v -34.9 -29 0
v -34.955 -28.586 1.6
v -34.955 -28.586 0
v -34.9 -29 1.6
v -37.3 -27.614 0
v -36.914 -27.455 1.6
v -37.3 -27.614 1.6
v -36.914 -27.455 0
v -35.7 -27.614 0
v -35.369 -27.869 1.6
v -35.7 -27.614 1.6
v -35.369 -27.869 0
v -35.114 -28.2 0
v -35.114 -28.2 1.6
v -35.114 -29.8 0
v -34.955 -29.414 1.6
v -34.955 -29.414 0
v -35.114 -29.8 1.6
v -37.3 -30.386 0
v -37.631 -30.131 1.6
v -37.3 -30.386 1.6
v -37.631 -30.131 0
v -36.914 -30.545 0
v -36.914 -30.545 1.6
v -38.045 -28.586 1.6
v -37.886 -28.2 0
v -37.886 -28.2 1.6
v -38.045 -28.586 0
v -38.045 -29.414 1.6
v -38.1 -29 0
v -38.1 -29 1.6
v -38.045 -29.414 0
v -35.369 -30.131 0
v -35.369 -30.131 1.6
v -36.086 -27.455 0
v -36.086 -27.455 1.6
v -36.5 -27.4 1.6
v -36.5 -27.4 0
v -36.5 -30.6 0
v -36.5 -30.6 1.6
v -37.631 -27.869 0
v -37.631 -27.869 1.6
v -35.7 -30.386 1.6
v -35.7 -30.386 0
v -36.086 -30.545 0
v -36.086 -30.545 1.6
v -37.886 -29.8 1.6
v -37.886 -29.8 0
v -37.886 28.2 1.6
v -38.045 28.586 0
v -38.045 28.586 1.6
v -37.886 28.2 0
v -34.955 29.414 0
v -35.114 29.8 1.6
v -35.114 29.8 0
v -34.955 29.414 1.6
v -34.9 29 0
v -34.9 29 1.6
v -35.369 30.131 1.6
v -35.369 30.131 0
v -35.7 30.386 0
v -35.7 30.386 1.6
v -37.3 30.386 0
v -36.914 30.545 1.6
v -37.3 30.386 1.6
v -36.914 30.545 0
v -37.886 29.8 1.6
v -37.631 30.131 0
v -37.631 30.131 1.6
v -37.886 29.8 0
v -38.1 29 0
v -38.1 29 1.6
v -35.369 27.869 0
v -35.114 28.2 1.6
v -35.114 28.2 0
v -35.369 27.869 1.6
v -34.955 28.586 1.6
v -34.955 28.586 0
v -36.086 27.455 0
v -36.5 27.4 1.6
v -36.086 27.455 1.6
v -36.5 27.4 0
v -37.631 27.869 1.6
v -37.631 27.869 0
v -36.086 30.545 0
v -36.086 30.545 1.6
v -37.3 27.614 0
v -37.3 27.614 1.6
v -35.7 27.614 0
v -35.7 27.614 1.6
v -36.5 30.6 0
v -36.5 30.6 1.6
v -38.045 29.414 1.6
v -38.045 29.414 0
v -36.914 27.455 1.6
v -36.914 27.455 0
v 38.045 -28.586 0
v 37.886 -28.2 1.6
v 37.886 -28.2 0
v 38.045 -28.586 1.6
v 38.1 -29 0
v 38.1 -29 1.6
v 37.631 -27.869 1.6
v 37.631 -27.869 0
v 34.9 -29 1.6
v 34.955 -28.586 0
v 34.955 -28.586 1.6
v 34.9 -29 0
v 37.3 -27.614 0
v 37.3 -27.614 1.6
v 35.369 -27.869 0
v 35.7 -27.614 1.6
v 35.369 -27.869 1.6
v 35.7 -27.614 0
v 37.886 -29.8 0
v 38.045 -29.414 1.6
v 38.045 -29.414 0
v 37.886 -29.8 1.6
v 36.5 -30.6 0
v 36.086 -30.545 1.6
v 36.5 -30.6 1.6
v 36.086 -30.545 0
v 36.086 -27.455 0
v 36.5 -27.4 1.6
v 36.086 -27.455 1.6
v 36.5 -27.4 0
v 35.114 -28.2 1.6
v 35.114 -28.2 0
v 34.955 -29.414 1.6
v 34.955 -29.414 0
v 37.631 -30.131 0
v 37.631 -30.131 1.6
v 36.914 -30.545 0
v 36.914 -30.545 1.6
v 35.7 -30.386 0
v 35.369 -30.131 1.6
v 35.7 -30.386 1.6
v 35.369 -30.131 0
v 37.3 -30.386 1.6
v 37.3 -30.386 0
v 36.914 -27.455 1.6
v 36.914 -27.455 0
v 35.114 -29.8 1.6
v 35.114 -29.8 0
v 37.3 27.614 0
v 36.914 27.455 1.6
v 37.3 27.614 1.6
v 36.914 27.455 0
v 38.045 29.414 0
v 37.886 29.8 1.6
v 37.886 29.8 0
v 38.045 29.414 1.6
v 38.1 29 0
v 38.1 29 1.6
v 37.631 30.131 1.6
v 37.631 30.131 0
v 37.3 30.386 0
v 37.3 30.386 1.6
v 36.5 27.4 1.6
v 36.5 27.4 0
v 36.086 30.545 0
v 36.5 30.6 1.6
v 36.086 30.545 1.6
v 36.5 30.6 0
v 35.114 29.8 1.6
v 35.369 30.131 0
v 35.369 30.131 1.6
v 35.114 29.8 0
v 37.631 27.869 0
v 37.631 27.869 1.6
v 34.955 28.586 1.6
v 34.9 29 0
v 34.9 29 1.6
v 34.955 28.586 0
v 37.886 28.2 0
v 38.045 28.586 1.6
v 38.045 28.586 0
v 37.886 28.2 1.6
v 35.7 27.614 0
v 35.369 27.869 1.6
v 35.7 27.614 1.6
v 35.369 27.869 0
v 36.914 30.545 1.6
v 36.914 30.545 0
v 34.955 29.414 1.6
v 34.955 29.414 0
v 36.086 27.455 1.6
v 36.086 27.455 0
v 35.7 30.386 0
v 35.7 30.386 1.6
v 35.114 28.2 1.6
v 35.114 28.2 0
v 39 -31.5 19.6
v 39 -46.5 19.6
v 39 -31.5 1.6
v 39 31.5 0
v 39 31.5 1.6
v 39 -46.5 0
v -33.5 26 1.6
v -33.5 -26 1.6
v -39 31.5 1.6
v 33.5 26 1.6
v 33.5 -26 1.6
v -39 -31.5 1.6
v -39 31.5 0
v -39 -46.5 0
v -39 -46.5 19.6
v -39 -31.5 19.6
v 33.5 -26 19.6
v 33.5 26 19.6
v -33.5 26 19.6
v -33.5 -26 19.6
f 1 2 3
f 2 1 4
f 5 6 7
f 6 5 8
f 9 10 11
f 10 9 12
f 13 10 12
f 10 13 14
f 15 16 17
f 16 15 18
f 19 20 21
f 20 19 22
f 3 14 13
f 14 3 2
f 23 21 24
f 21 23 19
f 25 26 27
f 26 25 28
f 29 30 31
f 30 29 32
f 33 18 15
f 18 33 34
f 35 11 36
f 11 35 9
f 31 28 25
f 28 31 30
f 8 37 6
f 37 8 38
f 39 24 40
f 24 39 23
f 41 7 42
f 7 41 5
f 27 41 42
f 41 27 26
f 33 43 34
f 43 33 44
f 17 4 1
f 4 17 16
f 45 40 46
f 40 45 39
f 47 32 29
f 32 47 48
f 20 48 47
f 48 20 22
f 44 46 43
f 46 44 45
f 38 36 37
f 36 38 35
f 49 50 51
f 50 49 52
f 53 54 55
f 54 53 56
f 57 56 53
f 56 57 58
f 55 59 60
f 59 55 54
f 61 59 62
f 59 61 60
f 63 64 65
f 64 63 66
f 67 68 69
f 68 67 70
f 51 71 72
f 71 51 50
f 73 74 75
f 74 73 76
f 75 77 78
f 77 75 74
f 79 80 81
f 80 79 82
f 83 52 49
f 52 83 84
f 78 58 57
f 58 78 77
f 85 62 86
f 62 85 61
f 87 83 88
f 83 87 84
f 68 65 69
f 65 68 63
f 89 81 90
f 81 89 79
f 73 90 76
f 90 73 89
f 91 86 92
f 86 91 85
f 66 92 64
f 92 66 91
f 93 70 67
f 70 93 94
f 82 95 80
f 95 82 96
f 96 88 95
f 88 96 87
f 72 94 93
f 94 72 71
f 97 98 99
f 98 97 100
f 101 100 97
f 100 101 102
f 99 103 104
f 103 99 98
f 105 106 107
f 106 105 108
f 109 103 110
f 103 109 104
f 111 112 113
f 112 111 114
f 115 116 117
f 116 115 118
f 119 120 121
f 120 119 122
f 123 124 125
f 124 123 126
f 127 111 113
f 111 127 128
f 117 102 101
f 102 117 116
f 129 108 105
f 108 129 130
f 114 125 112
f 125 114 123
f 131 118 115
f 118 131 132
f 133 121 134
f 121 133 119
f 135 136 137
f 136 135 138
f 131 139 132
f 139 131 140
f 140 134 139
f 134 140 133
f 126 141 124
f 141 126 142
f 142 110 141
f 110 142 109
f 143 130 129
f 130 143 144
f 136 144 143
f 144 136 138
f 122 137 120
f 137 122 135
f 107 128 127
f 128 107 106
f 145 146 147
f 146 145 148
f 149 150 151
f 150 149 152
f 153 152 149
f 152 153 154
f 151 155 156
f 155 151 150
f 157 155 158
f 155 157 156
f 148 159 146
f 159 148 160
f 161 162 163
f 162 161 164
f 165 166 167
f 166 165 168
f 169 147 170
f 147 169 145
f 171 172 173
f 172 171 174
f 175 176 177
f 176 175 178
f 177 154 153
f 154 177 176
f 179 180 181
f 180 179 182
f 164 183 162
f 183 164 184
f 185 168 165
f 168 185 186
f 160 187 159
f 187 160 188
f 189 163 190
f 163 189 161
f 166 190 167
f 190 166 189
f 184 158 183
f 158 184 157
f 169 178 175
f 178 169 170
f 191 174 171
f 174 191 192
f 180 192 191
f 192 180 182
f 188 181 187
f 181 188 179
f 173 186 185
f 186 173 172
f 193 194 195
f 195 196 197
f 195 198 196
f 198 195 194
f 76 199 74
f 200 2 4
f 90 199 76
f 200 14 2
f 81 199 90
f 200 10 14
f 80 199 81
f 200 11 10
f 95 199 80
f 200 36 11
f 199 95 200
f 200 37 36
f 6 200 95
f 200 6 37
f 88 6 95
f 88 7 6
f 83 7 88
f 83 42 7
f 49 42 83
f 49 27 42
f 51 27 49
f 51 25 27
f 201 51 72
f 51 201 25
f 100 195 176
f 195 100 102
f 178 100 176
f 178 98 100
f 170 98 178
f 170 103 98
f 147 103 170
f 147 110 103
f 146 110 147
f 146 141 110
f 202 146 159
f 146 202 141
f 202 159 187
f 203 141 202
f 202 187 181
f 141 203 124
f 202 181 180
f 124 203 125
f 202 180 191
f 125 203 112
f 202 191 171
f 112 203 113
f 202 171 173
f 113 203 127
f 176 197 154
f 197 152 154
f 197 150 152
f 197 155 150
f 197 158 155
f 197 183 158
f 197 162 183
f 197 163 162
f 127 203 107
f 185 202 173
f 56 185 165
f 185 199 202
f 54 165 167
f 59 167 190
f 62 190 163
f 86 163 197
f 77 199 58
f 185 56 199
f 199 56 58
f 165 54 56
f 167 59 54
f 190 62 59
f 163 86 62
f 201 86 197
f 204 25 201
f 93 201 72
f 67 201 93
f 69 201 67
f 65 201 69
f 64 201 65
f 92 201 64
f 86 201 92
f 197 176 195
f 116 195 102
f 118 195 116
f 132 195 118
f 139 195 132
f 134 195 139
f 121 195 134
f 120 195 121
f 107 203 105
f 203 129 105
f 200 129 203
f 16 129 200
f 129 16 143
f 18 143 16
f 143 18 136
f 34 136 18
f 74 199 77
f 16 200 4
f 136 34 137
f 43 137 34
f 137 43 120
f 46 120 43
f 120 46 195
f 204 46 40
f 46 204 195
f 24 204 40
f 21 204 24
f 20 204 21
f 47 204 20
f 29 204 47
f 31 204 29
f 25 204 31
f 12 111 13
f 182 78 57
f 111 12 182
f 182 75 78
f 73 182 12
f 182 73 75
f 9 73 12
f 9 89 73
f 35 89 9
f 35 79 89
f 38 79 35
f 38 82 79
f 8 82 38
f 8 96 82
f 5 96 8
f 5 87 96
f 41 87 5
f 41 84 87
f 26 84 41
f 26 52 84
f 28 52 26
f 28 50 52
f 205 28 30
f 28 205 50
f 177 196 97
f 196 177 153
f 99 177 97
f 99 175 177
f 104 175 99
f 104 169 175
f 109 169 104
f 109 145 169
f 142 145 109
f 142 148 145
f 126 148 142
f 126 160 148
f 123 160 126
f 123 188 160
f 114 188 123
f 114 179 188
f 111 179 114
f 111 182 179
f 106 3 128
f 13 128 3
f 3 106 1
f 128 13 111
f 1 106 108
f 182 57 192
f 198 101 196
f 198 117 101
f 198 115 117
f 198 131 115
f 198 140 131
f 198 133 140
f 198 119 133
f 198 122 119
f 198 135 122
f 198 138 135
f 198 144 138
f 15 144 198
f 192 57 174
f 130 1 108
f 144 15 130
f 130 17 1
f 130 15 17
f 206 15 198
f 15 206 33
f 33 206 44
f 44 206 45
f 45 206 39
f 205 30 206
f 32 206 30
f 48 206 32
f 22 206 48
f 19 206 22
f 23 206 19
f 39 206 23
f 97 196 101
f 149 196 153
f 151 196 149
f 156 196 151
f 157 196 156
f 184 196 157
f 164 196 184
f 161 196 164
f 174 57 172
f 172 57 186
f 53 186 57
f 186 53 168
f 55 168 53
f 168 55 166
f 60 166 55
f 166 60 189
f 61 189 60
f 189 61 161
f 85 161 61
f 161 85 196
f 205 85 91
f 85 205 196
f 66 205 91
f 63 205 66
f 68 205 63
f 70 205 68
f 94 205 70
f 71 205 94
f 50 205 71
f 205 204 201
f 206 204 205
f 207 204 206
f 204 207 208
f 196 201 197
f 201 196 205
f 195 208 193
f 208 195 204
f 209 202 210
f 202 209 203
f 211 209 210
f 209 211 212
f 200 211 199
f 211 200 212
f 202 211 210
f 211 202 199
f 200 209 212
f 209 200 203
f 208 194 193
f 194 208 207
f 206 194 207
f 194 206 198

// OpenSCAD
//
// ============================================================================
// SteamMachine UM790
// Project Phoenix
//
// Archivo  : esp32.scad
// Versión  : 1.0
// Fecha    : 2026-08-03
//
// Volumen mecánico de referencia de la placa "ESP32 Terminal Adapter"
// (78 x 63 mm, taladros M3 con separación 73 x 58 mm) para el
// ensamblaje virtual v1.
//
// NO ES UNA PIEZA IMPRIMIBLE.
//
// Sistema de coordenadas LOCAL de este módulo:
//   Origen (0,0,0) = centro de la placa en X/Y, cara inferior
//                     (plano de apoyo sobre la repisa de montaje).
//   +Z = hacia arriba (hacia el módulo ESP32 y las regletas).
//
// ============================================================================

include <../../../00_parametros.scad>;

$fn = 24;

part_version = "1.0";


//=============================================================================
// COLORES
//=============================================================================

esp32BoardColor     = [0.65,0.10,0.10,1.0];
esp32ModuleColor    = [0.15,0.15,0.55,1.0];
esp32HoleColor      = [1.00,0.00,0.00,1.0];
esp32CableColor     = [1.00,0.65,0.00,0.15];


//=============================================================================
// PLACA ADAPTADORA
//=============================================================================

module esp32AdapterBoard()
{

    color(esp32BoardColor)

    difference()
    {

        translate([
            -esp32_adapter_width/2,
            -esp32_adapter_depth/2,
            0
        ])

            cube([
                esp32_adapter_width,
                esp32_adapter_depth,
                esp32_adapter_thickness
            ]);

        esp32MountHoles();

    }

}


//=============================================================================
// TALADROS M3 (73 x 58 mm)
//=============================================================================

module esp32MountHoles()
{

    color(esp32HoleColor)

    for(ix=[-1,1])
    for(iy=[-1,1])

        translate([
            ix*esp32_adapter_hole_spacing_x/2,
            iy*esp32_adapter_hole_spacing_y/2,
            -0.5
        ])

            cylinder(
                d = esp32_adapter_hole_diameter,
                h = esp32_adapter_thickness+1
            );

}


//=============================================================================
// VOLUMEN DEL MÓDULO ESP32 + REGLETAS + CABLEADO SUPERIOR
//
// Bloque simplificado que engloba el DevKit ESP32, las regletas de
// terminales y el margen para el cableado que sale hacia arriba.
// Se apoya centrado sobre la placa adaptadora, con un margen respecto
// a los taladros de fijación.
//=============================================================================

module esp32ComponentVolume()
{

    componentWidth = esp32_adapter_hole_spacing_x - 6;
    componentDepth = esp32_adapter_hole_spacing_y - 6;

    color(esp32ModuleColor)

    translate([
        -componentWidth/2,
        -componentDepth/2,
        esp32_adapter_thickness
    ])

        cube([
            componentWidth,
            componentDepth,
            esp32_adapter_component_height
        ]);

}


//=============================================================================
// CUERPO MECÁNICO (para comprobación de colisiones "duras")
//=============================================================================

module esp32Body()
{

    union()
    {
        esp32AdapterBoard();
        esp32ComponentVolume();
    }

}


//=============================================================================
// VOLUMEN DE SEGURIDAD DE CABLEADO
//
// Espacio reservado en el borde -Y de la placa para el conexionado
// hacia el RC522, el HUB USB, el OLED y el pulsador.
//=============================================================================

module esp32CableKeepout(length = 15)
{

    color(esp32CableColor)

    translate([
        -esp32_adapter_width/2,
        -esp32_adapter_depth/2 - length,
        0
    ])

        cube([
            esp32_adapter_width,
            length,
            esp32_adapter_thickness + esp32_adapter_component_height
        ]);

}


//=============================================================================
// CONJUNTO COMPLETO (visualización)
//=============================================================================

module esp32()
{

    esp32Body();

    esp32CableKeepout();

}


//=============================================================================
// PREVIEW
//=============================================================================

esp32();
